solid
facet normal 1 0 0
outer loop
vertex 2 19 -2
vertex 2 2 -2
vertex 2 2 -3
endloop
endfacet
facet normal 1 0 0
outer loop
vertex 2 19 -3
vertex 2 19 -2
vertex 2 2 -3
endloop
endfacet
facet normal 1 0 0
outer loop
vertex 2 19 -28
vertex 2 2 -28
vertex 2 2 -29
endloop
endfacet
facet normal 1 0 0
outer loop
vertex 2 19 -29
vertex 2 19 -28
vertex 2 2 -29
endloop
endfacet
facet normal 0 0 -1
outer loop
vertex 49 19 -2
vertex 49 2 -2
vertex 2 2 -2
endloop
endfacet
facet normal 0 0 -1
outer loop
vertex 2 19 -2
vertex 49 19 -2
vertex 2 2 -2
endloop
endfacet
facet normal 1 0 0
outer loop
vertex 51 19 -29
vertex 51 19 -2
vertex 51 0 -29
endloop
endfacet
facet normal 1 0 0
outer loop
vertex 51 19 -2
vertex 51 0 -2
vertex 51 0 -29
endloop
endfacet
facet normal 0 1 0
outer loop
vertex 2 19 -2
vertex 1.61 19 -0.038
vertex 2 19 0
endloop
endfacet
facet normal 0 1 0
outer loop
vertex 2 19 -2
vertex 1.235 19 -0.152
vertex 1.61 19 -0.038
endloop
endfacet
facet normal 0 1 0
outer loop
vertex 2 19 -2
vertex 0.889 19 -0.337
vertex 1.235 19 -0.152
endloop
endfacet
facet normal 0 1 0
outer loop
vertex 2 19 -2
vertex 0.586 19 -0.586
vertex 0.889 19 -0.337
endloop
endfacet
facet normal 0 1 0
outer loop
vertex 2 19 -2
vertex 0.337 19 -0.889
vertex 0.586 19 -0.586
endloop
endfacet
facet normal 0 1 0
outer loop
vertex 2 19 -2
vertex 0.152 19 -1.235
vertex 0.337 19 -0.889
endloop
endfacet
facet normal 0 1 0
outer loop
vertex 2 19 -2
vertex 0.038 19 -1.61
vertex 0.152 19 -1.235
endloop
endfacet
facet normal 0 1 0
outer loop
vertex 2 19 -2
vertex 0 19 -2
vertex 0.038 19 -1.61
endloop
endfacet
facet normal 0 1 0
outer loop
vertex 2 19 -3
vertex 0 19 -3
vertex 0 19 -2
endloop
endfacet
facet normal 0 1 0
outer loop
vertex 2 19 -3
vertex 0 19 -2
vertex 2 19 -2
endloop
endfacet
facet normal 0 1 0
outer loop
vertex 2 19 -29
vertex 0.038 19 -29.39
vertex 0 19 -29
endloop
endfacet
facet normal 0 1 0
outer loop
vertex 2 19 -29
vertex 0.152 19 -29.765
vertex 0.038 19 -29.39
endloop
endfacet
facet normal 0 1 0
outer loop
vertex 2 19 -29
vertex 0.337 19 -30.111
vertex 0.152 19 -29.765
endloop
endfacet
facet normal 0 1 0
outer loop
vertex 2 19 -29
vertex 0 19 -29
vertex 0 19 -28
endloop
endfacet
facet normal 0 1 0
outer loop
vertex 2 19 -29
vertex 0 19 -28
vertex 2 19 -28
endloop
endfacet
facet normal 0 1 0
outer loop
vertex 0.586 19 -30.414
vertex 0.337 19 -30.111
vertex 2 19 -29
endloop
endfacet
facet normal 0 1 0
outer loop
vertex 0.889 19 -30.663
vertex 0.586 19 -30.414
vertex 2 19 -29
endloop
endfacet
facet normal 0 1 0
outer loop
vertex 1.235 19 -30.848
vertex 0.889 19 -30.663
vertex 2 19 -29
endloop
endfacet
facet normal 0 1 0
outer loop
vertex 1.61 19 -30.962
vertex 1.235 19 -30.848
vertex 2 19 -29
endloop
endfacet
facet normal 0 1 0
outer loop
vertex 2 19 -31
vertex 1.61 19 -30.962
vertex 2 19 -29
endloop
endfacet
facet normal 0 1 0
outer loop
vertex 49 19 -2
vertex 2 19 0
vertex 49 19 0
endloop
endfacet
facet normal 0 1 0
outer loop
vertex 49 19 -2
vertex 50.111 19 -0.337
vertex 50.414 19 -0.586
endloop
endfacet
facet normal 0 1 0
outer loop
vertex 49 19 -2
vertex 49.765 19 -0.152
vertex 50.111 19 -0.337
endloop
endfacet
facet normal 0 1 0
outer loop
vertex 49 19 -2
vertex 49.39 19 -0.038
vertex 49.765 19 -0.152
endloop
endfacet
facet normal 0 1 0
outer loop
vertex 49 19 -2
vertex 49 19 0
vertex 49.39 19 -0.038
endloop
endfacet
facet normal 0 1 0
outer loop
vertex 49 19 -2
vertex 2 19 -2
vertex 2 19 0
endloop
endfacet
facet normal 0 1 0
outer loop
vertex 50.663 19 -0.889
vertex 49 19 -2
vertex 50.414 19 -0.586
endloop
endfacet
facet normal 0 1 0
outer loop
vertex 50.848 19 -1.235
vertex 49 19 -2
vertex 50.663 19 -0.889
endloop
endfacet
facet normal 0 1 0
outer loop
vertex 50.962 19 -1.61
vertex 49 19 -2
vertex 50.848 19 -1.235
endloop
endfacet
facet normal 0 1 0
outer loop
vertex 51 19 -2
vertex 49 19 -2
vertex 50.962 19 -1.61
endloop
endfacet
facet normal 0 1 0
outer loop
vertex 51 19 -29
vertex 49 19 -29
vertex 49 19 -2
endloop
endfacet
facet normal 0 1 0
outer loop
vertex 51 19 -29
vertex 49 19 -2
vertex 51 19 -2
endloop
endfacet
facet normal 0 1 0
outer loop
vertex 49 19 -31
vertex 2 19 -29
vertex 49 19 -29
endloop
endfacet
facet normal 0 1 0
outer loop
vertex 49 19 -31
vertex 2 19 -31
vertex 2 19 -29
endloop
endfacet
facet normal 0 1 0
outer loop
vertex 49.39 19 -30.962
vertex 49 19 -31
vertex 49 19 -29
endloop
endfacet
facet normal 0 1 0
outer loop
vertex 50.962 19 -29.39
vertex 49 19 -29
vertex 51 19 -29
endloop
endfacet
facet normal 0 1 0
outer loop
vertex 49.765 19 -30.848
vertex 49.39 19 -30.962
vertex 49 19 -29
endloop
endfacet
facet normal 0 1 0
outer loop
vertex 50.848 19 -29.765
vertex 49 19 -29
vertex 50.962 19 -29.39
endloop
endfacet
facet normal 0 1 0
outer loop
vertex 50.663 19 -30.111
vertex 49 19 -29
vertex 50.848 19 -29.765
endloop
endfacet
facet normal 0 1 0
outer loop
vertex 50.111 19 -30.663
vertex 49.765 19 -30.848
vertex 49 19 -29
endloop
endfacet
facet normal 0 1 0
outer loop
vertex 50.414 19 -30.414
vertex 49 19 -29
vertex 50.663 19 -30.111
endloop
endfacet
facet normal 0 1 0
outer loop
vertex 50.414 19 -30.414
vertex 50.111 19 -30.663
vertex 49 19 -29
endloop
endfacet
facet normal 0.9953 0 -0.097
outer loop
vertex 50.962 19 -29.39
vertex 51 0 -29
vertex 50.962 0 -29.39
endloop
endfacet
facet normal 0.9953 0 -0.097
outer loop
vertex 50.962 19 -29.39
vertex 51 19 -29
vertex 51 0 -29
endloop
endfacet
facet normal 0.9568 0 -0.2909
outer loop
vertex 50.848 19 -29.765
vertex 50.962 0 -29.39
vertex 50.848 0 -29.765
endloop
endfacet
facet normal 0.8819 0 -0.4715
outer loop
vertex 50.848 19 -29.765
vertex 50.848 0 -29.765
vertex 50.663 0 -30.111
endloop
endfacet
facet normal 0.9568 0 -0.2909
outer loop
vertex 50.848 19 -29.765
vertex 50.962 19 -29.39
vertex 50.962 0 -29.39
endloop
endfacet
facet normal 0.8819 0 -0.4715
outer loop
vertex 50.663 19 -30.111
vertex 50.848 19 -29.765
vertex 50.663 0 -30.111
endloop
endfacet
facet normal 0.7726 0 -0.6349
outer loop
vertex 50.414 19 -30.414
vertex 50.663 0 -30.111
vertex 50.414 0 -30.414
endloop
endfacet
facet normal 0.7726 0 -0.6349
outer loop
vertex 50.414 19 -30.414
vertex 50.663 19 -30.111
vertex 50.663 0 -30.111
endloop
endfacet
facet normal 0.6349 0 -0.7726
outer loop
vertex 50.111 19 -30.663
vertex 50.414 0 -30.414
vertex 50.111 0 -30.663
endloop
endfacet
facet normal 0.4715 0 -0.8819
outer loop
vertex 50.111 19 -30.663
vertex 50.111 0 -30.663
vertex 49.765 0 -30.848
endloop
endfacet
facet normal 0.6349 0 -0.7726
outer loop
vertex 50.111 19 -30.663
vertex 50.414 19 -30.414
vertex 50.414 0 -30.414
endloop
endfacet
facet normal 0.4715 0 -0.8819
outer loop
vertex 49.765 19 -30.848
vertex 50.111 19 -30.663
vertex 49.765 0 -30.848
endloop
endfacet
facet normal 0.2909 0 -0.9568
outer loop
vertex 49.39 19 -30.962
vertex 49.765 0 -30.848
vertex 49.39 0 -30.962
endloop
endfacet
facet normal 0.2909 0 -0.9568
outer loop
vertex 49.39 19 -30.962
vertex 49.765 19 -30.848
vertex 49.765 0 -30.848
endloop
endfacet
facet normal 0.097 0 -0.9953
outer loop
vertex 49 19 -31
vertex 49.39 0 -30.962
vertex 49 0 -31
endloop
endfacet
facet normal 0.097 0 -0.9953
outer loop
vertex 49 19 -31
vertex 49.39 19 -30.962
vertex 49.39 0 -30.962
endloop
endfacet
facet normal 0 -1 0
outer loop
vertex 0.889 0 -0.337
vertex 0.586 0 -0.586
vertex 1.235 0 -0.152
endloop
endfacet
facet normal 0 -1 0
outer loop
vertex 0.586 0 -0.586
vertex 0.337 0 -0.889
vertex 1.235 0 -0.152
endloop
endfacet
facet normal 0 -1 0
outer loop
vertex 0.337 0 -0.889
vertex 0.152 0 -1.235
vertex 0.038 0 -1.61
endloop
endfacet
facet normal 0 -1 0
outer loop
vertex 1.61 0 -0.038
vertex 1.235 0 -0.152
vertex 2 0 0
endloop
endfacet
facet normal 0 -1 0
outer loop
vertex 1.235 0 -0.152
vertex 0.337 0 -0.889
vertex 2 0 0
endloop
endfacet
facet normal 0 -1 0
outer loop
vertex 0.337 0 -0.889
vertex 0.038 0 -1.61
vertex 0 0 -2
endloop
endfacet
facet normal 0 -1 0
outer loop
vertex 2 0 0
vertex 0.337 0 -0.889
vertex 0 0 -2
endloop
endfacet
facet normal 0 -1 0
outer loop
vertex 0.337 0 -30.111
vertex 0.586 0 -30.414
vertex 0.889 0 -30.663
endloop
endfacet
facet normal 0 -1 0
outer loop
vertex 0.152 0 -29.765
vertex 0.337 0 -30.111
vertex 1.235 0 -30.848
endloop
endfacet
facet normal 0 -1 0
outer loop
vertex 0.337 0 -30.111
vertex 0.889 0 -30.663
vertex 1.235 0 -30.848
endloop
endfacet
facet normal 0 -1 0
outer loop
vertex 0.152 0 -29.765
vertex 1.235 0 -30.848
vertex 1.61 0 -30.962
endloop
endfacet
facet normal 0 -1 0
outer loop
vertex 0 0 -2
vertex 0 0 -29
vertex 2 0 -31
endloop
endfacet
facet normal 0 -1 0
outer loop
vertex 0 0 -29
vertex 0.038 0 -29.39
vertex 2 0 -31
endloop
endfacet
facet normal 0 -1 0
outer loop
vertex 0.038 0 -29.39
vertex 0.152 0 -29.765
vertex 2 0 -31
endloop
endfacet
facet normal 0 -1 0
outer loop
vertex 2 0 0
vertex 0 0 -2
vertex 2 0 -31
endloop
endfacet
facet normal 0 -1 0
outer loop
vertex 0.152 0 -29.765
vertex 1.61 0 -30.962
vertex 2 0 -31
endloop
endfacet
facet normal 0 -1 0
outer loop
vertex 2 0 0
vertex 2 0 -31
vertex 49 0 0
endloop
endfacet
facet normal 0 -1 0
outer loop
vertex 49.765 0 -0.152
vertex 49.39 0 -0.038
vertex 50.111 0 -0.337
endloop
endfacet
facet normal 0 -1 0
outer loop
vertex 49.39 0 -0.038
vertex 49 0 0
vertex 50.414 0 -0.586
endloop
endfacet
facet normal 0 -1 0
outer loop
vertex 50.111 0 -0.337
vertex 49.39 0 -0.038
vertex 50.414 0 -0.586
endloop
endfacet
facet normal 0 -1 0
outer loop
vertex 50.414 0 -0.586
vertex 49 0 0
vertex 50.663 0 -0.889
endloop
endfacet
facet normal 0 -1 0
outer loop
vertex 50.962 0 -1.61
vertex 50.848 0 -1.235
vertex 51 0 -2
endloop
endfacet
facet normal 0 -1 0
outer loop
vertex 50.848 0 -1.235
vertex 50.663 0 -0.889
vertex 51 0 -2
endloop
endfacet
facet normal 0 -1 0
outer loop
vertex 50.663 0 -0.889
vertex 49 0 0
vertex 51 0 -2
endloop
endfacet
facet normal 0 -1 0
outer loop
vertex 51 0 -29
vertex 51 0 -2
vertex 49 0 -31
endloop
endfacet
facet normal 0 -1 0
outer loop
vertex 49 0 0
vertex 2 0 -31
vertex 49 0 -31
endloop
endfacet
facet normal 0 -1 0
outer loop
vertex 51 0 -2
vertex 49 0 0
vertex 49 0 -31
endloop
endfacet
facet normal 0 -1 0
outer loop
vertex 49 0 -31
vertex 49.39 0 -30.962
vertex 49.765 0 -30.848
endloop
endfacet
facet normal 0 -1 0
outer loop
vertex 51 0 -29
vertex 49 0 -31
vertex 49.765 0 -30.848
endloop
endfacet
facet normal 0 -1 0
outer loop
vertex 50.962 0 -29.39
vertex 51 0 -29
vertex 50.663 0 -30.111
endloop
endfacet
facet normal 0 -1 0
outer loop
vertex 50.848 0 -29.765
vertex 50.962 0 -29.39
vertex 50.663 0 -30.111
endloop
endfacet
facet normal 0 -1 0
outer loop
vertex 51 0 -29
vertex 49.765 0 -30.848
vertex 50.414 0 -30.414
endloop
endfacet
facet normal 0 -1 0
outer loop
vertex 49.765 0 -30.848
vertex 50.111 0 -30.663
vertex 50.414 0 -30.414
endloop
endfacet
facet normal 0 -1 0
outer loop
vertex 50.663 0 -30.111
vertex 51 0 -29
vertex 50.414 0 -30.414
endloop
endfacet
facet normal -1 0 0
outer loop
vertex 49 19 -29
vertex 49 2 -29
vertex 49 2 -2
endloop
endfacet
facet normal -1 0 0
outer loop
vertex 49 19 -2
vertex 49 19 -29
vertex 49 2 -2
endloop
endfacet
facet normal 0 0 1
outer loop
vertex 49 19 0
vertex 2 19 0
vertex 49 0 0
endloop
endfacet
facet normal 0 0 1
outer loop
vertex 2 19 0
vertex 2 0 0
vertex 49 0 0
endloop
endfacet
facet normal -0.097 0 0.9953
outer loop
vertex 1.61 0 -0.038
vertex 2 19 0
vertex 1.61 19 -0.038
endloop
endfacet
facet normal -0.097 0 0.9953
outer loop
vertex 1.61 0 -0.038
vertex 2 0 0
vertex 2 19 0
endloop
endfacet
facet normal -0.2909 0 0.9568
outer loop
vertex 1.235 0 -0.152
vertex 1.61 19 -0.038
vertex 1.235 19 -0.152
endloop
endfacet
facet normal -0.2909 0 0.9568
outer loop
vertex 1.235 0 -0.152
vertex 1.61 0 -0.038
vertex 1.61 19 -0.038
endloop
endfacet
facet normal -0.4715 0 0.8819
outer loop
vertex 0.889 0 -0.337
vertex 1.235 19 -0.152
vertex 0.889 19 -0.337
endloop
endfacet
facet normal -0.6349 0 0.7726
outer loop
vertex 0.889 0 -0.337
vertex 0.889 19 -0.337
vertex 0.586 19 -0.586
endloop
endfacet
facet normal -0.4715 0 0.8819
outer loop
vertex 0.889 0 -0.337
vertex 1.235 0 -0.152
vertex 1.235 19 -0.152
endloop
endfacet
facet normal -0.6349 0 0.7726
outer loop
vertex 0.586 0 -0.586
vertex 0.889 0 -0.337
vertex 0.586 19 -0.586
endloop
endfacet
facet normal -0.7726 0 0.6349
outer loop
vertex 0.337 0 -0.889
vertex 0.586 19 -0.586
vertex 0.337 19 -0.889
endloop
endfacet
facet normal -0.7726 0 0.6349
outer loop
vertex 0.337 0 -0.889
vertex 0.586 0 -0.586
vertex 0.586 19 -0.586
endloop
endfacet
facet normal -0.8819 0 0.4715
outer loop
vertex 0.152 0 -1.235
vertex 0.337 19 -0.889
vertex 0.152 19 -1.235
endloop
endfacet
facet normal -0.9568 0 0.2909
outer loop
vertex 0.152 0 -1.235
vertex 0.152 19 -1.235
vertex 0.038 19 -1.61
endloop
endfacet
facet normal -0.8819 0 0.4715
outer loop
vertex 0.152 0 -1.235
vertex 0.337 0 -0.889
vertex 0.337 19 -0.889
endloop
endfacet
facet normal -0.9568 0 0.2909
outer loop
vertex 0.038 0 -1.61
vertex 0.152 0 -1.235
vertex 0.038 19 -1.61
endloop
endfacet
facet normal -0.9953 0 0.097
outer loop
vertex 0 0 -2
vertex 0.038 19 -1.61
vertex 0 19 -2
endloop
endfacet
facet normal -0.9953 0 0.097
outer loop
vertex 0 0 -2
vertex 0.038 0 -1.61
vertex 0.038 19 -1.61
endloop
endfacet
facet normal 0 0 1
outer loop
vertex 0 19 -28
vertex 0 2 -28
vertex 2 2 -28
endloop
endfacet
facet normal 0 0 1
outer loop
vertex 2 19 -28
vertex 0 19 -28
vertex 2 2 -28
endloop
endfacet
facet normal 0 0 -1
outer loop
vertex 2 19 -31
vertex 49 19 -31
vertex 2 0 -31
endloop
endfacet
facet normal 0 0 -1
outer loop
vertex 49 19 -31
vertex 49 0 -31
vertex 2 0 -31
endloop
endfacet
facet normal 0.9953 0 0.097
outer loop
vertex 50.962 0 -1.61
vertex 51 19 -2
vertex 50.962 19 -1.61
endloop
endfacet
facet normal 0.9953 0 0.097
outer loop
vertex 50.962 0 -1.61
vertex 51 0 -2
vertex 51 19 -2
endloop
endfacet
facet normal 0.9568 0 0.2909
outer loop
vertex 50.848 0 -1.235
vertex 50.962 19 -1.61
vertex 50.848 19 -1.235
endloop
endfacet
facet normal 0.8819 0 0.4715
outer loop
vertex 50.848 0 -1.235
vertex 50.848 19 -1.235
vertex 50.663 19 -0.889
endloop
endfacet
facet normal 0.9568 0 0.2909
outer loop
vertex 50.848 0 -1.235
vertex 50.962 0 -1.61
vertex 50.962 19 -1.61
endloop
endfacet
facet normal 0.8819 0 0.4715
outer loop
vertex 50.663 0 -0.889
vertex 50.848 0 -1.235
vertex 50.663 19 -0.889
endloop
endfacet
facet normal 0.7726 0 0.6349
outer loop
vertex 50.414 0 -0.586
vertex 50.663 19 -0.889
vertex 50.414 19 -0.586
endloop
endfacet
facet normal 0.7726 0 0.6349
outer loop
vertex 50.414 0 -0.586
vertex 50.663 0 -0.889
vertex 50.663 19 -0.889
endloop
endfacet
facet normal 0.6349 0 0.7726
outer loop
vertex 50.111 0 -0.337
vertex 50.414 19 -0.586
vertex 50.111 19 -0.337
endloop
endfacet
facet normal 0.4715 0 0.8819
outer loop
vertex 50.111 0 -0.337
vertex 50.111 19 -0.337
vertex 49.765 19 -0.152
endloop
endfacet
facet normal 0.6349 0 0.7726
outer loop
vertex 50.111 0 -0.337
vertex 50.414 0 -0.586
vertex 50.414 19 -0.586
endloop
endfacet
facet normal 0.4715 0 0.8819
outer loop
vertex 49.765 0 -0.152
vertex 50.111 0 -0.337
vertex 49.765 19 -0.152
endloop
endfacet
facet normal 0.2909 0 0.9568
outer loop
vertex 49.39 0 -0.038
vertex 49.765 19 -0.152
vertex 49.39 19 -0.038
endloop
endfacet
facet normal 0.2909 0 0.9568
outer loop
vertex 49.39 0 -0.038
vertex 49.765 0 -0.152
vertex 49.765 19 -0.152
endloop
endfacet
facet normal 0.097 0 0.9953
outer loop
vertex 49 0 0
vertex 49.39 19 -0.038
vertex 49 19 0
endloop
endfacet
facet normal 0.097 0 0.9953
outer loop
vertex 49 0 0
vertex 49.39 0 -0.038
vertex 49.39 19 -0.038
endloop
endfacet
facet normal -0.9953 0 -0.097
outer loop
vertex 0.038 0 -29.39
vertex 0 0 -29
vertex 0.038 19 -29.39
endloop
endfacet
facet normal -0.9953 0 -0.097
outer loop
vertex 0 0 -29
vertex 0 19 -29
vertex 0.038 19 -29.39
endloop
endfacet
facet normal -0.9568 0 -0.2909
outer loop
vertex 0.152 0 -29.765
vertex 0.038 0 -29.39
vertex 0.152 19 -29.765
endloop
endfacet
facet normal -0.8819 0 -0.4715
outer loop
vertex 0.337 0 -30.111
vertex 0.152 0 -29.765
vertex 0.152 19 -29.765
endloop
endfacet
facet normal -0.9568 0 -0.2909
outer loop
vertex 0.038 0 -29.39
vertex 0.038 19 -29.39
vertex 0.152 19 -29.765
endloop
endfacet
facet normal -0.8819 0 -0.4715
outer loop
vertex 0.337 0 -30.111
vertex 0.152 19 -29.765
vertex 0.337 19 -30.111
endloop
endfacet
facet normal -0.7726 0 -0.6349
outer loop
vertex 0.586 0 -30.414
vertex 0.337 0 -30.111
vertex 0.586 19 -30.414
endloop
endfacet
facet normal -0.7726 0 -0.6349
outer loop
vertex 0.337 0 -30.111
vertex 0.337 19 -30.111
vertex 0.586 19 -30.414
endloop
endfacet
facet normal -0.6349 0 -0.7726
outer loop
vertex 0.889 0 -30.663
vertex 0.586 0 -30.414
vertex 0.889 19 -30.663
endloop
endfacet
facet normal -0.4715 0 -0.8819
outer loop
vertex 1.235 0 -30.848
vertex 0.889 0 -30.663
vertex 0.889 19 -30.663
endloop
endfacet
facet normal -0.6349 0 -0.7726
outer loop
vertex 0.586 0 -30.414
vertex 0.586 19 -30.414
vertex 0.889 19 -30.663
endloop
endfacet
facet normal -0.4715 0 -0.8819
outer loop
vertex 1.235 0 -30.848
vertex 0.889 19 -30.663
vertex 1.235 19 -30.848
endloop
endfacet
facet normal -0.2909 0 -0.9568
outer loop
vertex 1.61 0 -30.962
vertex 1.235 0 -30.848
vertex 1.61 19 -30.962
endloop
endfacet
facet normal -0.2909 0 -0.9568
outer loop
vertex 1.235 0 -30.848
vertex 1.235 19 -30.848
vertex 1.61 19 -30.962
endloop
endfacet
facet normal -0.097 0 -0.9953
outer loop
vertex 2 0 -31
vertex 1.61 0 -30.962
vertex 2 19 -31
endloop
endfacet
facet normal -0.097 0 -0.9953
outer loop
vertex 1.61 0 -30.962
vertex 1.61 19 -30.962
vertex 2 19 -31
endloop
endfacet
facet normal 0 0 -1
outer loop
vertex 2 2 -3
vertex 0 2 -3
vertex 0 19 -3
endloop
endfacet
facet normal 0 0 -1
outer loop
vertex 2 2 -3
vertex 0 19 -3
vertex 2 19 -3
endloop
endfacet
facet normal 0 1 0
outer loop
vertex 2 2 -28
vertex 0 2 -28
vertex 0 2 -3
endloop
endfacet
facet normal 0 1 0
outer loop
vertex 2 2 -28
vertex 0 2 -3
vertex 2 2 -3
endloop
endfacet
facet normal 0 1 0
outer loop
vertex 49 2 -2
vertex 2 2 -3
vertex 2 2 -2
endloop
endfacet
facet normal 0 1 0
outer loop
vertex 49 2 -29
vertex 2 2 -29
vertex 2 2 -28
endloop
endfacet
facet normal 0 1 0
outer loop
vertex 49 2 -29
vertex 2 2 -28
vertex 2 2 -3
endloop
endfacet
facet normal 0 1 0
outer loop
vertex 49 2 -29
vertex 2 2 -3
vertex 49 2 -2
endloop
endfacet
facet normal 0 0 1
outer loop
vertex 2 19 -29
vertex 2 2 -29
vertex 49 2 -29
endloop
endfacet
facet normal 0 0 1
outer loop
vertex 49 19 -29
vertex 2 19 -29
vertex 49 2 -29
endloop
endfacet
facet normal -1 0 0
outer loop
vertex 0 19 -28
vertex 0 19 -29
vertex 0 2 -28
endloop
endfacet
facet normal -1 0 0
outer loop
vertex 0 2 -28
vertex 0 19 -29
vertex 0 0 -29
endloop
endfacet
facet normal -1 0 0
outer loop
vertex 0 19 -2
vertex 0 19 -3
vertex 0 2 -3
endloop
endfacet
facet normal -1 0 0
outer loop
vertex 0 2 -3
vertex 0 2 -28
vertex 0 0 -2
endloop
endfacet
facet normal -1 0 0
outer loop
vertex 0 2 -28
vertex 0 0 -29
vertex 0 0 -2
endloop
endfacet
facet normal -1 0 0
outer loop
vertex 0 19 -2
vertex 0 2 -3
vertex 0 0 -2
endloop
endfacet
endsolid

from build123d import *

# Parameters (mm, degrees)
SKETCH1_W           = 51
SKETCH1_H           = 31
BOSS_EXTRUDE1_DEPTH = 2
SKETCH2_W           = 2
SKETCH2_H           = 1
BOSS_EXTRUDE2_DEPTH = 17
FILLET3_R           = 2
FILLET4_R           = 2
FILLET5_R           = 2
FILLET6_R           = 2


with BuildPart() as part:
    # Sketch1 → Boss-Extrude1 (new body)
    with BuildSketch(Plane(origin=(0, 0, 0), x_dir=(1, 0, 0), z_dir=(0, 1, 0))):
        with Locations((25.5, 15.5)):
            Rectangle(SKETCH1_W, SKETCH1_H)
    extrude(amount=BOSS_EXTRUDE1_DEPTH)

    # Sketch2 → Boss-Extrude2 (add)
    with BuildSketch(Plane(origin=(0, 2, 0), x_dir=(1, 0, 0), z_dir=(0, 1, 0))):
        Polygon((49, 2), (49, 0), (51, 0), (51, 31), (49, 31), (49, 29), align=None)
        Polygon((0, 2), (0, 0), (49, 0), (49, 2), (2, 2), align=None)
        Polygon((2, 29), (49, 29), (49, 31), (0, 31), (0, 29), align=None)
        with Locations((1, 28.5)):
            Rectangle(SKETCH2_W, SKETCH2_H)
        with Locations((1, 2.5)):
            Rectangle(SKETCH2_W, SKETCH2_H)
    extrude(amount=BOSS_EXTRUDE2_DEPTH)

    # Fillet3
    fillet3_edges = [part.edges().sort_by_distance(p)[0] for p in [
        (51, 9.5, 0),
    ]]
    fillet(fillet3_edges, radius=FILLET3_R)

    # Fillet4
    fillet4_edges = [part.edges().sort_by_distance(p)[0] for p in [
        (51, 9.5, -31),
    ]]
    fillet(fillet4_edges, radius=FILLET4_R)

    # Fillet5
    fillet5_edges = [part.edges().sort_by_distance(p)[0] for p in [
        (0, 9.5, 0),
    ]]
    fillet(fillet5_edges, radius=FILLET5_R)

    # Fillet6
    fillet6_edges = [part.edges().sort_by_distance(p)[0] for p in [
        (0, 9.5, -31),
    ]]
    fillet(fillet6_edges, radius=FILLET6_R)


solid = part.part
